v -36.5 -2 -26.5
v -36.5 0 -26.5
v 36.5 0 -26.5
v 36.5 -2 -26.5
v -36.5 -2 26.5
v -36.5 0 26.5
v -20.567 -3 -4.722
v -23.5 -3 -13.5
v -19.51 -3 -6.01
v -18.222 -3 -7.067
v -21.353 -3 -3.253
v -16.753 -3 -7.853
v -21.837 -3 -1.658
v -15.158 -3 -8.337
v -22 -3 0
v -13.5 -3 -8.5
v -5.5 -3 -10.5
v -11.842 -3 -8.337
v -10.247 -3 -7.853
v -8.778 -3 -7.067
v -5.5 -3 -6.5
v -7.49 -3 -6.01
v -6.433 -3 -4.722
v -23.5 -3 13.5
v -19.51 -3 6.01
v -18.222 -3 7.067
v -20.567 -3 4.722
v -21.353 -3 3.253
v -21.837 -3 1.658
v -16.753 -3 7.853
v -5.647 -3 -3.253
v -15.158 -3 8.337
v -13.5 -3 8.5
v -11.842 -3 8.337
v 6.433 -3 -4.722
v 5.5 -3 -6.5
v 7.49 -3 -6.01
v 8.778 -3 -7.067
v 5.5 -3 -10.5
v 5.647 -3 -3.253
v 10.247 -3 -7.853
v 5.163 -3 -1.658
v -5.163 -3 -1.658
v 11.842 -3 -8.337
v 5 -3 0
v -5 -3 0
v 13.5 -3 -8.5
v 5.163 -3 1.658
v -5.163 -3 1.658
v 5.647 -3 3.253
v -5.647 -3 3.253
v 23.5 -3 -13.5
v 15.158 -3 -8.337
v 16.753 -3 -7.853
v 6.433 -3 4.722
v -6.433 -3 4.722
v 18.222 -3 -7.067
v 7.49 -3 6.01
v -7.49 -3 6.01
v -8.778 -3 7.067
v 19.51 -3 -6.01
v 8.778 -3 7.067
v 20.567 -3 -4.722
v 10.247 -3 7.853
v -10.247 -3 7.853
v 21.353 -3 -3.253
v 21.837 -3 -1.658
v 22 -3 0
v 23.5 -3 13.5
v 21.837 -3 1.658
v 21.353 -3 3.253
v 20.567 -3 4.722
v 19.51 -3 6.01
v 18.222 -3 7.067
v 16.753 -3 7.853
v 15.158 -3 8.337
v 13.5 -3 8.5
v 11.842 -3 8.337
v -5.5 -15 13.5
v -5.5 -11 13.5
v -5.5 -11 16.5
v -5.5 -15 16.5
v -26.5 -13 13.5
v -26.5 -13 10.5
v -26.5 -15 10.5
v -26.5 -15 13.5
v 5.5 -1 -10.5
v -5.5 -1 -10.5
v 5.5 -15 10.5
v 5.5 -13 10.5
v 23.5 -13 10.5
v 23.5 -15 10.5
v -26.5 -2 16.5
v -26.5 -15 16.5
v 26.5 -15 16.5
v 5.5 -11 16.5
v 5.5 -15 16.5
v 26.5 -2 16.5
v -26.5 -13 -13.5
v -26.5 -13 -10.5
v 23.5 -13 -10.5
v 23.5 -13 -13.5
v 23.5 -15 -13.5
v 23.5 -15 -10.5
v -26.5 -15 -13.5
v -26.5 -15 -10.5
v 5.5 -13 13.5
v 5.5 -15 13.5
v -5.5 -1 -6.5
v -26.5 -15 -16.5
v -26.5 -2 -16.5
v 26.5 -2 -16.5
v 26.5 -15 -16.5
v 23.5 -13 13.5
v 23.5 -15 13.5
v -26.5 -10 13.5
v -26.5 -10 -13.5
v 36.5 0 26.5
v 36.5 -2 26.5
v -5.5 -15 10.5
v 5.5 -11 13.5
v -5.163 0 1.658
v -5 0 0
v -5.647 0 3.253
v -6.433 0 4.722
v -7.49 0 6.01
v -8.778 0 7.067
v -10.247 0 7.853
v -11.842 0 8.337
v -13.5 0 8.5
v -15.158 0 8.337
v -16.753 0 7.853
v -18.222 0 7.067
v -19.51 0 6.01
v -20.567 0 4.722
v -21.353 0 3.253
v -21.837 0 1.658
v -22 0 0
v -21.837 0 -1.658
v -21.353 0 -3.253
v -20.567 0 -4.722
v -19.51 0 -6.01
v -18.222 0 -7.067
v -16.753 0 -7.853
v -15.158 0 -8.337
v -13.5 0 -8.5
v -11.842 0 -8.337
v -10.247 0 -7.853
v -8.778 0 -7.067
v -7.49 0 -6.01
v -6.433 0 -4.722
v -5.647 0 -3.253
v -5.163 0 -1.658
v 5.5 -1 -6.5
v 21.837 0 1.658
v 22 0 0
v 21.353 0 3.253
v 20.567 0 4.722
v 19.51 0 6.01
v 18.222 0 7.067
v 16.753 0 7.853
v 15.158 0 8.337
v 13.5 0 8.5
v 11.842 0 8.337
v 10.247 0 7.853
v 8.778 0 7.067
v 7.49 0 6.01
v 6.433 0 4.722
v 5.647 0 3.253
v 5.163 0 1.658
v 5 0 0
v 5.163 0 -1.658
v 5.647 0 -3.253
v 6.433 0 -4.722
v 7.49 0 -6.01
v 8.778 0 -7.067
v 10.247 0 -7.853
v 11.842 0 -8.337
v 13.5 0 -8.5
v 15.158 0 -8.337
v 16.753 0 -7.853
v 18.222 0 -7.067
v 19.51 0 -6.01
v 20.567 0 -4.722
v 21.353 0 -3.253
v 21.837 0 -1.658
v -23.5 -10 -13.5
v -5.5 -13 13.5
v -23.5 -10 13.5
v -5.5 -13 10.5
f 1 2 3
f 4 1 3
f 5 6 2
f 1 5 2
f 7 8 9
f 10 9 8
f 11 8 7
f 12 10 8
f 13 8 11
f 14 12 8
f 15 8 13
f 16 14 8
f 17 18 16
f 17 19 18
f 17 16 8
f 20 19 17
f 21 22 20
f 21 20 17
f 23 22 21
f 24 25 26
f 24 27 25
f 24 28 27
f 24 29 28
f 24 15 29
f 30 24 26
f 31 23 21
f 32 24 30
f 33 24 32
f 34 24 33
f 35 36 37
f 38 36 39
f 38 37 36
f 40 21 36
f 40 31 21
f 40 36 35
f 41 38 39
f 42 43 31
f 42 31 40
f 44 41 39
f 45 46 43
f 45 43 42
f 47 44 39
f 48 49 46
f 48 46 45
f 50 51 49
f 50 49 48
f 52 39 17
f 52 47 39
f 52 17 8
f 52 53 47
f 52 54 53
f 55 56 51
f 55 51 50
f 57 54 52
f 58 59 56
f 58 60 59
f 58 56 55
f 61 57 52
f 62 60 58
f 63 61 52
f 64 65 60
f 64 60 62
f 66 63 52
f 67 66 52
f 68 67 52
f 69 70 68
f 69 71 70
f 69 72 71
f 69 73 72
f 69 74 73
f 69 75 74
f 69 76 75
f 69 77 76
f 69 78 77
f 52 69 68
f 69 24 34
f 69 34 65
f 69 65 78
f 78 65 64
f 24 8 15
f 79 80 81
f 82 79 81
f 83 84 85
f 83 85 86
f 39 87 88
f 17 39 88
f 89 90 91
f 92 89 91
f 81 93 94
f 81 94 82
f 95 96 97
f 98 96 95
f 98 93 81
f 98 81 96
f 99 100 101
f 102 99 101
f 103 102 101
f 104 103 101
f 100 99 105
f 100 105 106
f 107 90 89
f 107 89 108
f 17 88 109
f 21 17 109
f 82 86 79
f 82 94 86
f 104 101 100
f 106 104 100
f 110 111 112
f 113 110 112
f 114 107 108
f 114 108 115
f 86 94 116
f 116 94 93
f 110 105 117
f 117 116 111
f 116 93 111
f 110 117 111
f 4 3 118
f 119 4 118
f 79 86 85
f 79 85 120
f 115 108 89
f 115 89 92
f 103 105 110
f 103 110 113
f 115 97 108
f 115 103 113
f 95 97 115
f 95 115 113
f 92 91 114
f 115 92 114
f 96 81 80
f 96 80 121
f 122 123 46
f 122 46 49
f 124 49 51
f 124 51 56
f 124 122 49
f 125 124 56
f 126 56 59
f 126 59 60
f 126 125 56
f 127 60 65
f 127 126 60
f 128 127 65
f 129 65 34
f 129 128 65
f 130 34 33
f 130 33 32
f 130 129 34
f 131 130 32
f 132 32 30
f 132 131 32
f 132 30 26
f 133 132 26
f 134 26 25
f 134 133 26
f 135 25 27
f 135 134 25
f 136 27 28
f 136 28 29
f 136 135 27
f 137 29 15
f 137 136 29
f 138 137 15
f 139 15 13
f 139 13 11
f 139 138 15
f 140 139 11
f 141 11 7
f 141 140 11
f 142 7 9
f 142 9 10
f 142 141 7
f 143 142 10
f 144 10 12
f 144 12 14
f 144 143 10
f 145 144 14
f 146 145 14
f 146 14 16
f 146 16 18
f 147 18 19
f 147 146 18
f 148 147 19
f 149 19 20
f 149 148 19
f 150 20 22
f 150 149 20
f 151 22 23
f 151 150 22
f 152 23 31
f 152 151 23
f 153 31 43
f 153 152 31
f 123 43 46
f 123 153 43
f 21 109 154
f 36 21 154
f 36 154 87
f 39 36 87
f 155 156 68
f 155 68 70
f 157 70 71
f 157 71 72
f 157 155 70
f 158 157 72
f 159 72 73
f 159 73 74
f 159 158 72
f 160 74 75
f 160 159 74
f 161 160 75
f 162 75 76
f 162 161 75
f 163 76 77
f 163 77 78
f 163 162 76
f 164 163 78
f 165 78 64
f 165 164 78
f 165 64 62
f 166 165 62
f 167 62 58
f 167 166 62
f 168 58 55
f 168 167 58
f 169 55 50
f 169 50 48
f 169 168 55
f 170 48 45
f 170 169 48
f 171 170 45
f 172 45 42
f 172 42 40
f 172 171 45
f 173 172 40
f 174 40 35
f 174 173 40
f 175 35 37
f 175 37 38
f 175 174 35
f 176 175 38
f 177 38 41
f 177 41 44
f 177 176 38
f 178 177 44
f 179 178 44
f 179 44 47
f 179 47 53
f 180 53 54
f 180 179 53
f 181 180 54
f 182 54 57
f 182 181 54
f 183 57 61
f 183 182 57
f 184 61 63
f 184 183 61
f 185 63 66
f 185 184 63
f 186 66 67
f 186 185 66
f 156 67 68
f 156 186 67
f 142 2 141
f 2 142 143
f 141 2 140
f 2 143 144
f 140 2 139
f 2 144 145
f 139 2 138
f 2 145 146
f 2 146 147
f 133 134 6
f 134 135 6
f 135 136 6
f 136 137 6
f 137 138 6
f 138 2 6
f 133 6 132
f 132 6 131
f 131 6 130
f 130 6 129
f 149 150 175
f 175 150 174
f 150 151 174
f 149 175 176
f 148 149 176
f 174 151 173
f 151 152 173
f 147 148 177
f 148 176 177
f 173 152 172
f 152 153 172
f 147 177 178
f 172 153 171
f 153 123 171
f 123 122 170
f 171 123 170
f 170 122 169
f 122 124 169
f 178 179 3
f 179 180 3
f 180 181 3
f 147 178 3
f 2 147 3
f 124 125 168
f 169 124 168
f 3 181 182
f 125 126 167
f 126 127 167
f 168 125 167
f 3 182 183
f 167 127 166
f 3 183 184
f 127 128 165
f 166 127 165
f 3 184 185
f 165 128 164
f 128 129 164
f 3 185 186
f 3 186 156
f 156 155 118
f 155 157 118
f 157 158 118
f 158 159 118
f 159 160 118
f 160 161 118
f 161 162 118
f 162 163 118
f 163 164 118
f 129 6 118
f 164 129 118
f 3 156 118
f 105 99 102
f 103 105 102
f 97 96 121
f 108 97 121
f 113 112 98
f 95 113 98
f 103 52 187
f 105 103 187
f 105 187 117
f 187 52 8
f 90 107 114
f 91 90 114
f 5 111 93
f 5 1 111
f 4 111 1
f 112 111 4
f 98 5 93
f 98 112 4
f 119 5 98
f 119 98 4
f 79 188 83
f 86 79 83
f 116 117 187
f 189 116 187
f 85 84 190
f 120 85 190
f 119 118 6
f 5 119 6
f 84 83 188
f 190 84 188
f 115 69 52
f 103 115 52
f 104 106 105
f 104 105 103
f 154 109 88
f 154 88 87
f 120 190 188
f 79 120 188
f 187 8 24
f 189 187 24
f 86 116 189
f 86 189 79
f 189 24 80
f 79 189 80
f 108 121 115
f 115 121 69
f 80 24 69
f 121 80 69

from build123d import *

# Parameters (mm, degrees)
F0_R     = 8.5
F0_W     = 18
F0_H     = 3
F0_W_2   = 11
F1_DEPTH = 3
F0_H_2   = 4
F2_DEPTH = 1
F3_DEPTH = 15
F4_DEPTH = 11
F5_DEPTH = 2
F0_W_3   = 3
F0_H_3   = 21
F6_DEPTH = 10
F7_START = 13
F7_DEPTH = 2


with BuildPart() as f1:
    # F0 (on Front) → F1 (new body)
    with BuildSketch(Plane.XZ):
        Polygon((-5.5, 10.5), (-23.5, 10.5), (-23.5, -10.5), (-5.5, -10.5), (-5.5, -6.5), (5.5, -6.5), (5.5, -10.5), (23.5, -10.5), (23.5, 10.5), (5.5, 10.5), align=None)
        with Locations((-13.5, 0)):
            Circle(F0_R, mode=Mode.SUBTRACT)
        with Locations((13.5, 0)):
            Circle(F0_R, mode=Mode.SUBTRACT)
        Polygon((-5.5, -10.5), (-23.5, -10.5), (-23.5, -13.5), (-5.5, -13.5), (5.5, -13.5), (23.5, -13.5), (23.5, -10.5), (5.5, -10.5), align=None)
        with Locations((-14.5, 12)):
            Rectangle(F0_W, F0_H)
        with Locations((0, 12)):
            Rectangle(F0_W_2, F0_H)
        with Locations((14.5, 12)):
            Rectangle(F0_W, F0_H)
    extrude(amount=F1_DEPTH)

    # F0 (on Front) → F2 (join)
    with BuildSketch(Plane.XZ):
        with Locations((0, -8.5)):
            Rectangle(F0_W_2, F0_H_2)
    extrude(amount=F2_DEPTH)

    # F0 (on Front) → F3 (join)
    with BuildSketch(Plane.XZ):
        Polygon((-26.5, 13.5), (-23.5, 13.5), (-5.5, 13.5), (-5.5, 16.5), (-26.5, 16.5), align=None)
        Polygon((5.5, 16.5), (5.5, 13.5), (23.5, 13.5), (26.5, 13.5), (26.5, 16.5), align=None)
        Polygon((26.5, 13.5), (23.5, 13.5), (23.5, 10.5), (23.5, -10.5), (23.5, -13.5), (26.5, -13.5), align=None)
        Polygon((26.5, -16.5), (26.5, -13.5), (23.5, -13.5), (5.5, -13.5), (5.5, -16.5), align=None)
        with Locations((0, -15)):
            Rectangle(F0_W_2, F0_H)
        Polygon((-5.5, -13.5), (-23.5, -13.5), (-26.5, -13.5), (-26.5, -16.5), (-5.5, -16.5), align=None)
    extrude(amount=F3_DEPTH)

    # F0 (on Front) → F4 (join)
    with BuildSketch(Plane.XZ):
        with Locations((0, 15)):
            Rectangle(F0_W_2, F0_H)
    extrude(amount=F4_DEPTH)

    # F0 (on Front) → F5 (join)
    with BuildSketch(Plane.XZ):
        Polygon((-26.5, 16.5), (-5.5, 16.5), (5.5, 16.5), (26.5, 16.5), (36.5, 16.5), (36.5, 26.5), (-36.5, 26.5), (-36.5, 16.5), align=None)
        Polygon((-26.5, 10.5), (-26.5, 13.5), (-26.5, 16.5), (-36.5, 16.5), (-36.5, -16.5), (-26.5, -16.5), (-26.5, -13.5), (-26.5, -10.5), align=None)
        Polygon((-26.5, -16.5), (-36.5, -16.5), (-36.5, -26.5), (36.5, -26.5), (36.5, -16.5), (26.5, -16.5), (5.5, -16.5), (-5.5, -16.5), align=None)
        Polygon((26.5, 16.5), (26.5, 13.5), (26.5, -13.5), (26.5, -16.5), (36.5, -16.5), (36.5, 16.5), align=None)
    extrude(amount=F5_DEPTH)

    # F0 (on Front) → F6 (join)
    with BuildSketch(Plane.XZ):
        with Locations((-25, 12)):
            Rectangle(F0_W_3, F0_H)
        with Locations((-25, 0)):
            Rectangle(F0_W_3, F0_H_3)
        with Locations((-25, -12)):
            Rectangle(F0_W_3, F0_H)
    extrude(amount=F6_DEPTH)


with BuildPart() as f7:
    # F0 (on Front) → F7 (new body)
    with BuildSketch(Plane.XZ.offset(F7_START)):
        with Locations((-25, 12)):
            Rectangle(F0_W_3, F0_H)
        with Locations((-14.5, 12)):
            Rectangle(F0_W, F0_H)
    extrude(amount=F7_DEPTH)


with BuildPart() as f7b:
    # F0 (on Front) → F7, piece 2 (new body)
    with BuildSketch(Plane.XZ.offset(F7_START)):
        with Locations((-25, -12)):
            Rectangle(F0_W_3, F0_H)
        Polygon((-5.5, -10.5), (-23.5, -10.5), (-23.5, -13.5), (-5.5, -13.5), (5.5, -13.5), (23.5, -13.5), (23.5, -10.5), (5.5, -10.5), align=None)
    extrude(amount=F7_DEPTH)


with BuildPart() as f7c:
    # F0 (on Front) → F7, piece 3 (new body)
    with BuildSketch(Plane.XZ.offset(F7_START)):
        with Locations((14.5, 12)):
            Rectangle(F0_W, F0_H)
    extrude(amount=F7_DEPTH)


solid = Compound([f1.part, f7.part, f7b.part, f7c.part])
